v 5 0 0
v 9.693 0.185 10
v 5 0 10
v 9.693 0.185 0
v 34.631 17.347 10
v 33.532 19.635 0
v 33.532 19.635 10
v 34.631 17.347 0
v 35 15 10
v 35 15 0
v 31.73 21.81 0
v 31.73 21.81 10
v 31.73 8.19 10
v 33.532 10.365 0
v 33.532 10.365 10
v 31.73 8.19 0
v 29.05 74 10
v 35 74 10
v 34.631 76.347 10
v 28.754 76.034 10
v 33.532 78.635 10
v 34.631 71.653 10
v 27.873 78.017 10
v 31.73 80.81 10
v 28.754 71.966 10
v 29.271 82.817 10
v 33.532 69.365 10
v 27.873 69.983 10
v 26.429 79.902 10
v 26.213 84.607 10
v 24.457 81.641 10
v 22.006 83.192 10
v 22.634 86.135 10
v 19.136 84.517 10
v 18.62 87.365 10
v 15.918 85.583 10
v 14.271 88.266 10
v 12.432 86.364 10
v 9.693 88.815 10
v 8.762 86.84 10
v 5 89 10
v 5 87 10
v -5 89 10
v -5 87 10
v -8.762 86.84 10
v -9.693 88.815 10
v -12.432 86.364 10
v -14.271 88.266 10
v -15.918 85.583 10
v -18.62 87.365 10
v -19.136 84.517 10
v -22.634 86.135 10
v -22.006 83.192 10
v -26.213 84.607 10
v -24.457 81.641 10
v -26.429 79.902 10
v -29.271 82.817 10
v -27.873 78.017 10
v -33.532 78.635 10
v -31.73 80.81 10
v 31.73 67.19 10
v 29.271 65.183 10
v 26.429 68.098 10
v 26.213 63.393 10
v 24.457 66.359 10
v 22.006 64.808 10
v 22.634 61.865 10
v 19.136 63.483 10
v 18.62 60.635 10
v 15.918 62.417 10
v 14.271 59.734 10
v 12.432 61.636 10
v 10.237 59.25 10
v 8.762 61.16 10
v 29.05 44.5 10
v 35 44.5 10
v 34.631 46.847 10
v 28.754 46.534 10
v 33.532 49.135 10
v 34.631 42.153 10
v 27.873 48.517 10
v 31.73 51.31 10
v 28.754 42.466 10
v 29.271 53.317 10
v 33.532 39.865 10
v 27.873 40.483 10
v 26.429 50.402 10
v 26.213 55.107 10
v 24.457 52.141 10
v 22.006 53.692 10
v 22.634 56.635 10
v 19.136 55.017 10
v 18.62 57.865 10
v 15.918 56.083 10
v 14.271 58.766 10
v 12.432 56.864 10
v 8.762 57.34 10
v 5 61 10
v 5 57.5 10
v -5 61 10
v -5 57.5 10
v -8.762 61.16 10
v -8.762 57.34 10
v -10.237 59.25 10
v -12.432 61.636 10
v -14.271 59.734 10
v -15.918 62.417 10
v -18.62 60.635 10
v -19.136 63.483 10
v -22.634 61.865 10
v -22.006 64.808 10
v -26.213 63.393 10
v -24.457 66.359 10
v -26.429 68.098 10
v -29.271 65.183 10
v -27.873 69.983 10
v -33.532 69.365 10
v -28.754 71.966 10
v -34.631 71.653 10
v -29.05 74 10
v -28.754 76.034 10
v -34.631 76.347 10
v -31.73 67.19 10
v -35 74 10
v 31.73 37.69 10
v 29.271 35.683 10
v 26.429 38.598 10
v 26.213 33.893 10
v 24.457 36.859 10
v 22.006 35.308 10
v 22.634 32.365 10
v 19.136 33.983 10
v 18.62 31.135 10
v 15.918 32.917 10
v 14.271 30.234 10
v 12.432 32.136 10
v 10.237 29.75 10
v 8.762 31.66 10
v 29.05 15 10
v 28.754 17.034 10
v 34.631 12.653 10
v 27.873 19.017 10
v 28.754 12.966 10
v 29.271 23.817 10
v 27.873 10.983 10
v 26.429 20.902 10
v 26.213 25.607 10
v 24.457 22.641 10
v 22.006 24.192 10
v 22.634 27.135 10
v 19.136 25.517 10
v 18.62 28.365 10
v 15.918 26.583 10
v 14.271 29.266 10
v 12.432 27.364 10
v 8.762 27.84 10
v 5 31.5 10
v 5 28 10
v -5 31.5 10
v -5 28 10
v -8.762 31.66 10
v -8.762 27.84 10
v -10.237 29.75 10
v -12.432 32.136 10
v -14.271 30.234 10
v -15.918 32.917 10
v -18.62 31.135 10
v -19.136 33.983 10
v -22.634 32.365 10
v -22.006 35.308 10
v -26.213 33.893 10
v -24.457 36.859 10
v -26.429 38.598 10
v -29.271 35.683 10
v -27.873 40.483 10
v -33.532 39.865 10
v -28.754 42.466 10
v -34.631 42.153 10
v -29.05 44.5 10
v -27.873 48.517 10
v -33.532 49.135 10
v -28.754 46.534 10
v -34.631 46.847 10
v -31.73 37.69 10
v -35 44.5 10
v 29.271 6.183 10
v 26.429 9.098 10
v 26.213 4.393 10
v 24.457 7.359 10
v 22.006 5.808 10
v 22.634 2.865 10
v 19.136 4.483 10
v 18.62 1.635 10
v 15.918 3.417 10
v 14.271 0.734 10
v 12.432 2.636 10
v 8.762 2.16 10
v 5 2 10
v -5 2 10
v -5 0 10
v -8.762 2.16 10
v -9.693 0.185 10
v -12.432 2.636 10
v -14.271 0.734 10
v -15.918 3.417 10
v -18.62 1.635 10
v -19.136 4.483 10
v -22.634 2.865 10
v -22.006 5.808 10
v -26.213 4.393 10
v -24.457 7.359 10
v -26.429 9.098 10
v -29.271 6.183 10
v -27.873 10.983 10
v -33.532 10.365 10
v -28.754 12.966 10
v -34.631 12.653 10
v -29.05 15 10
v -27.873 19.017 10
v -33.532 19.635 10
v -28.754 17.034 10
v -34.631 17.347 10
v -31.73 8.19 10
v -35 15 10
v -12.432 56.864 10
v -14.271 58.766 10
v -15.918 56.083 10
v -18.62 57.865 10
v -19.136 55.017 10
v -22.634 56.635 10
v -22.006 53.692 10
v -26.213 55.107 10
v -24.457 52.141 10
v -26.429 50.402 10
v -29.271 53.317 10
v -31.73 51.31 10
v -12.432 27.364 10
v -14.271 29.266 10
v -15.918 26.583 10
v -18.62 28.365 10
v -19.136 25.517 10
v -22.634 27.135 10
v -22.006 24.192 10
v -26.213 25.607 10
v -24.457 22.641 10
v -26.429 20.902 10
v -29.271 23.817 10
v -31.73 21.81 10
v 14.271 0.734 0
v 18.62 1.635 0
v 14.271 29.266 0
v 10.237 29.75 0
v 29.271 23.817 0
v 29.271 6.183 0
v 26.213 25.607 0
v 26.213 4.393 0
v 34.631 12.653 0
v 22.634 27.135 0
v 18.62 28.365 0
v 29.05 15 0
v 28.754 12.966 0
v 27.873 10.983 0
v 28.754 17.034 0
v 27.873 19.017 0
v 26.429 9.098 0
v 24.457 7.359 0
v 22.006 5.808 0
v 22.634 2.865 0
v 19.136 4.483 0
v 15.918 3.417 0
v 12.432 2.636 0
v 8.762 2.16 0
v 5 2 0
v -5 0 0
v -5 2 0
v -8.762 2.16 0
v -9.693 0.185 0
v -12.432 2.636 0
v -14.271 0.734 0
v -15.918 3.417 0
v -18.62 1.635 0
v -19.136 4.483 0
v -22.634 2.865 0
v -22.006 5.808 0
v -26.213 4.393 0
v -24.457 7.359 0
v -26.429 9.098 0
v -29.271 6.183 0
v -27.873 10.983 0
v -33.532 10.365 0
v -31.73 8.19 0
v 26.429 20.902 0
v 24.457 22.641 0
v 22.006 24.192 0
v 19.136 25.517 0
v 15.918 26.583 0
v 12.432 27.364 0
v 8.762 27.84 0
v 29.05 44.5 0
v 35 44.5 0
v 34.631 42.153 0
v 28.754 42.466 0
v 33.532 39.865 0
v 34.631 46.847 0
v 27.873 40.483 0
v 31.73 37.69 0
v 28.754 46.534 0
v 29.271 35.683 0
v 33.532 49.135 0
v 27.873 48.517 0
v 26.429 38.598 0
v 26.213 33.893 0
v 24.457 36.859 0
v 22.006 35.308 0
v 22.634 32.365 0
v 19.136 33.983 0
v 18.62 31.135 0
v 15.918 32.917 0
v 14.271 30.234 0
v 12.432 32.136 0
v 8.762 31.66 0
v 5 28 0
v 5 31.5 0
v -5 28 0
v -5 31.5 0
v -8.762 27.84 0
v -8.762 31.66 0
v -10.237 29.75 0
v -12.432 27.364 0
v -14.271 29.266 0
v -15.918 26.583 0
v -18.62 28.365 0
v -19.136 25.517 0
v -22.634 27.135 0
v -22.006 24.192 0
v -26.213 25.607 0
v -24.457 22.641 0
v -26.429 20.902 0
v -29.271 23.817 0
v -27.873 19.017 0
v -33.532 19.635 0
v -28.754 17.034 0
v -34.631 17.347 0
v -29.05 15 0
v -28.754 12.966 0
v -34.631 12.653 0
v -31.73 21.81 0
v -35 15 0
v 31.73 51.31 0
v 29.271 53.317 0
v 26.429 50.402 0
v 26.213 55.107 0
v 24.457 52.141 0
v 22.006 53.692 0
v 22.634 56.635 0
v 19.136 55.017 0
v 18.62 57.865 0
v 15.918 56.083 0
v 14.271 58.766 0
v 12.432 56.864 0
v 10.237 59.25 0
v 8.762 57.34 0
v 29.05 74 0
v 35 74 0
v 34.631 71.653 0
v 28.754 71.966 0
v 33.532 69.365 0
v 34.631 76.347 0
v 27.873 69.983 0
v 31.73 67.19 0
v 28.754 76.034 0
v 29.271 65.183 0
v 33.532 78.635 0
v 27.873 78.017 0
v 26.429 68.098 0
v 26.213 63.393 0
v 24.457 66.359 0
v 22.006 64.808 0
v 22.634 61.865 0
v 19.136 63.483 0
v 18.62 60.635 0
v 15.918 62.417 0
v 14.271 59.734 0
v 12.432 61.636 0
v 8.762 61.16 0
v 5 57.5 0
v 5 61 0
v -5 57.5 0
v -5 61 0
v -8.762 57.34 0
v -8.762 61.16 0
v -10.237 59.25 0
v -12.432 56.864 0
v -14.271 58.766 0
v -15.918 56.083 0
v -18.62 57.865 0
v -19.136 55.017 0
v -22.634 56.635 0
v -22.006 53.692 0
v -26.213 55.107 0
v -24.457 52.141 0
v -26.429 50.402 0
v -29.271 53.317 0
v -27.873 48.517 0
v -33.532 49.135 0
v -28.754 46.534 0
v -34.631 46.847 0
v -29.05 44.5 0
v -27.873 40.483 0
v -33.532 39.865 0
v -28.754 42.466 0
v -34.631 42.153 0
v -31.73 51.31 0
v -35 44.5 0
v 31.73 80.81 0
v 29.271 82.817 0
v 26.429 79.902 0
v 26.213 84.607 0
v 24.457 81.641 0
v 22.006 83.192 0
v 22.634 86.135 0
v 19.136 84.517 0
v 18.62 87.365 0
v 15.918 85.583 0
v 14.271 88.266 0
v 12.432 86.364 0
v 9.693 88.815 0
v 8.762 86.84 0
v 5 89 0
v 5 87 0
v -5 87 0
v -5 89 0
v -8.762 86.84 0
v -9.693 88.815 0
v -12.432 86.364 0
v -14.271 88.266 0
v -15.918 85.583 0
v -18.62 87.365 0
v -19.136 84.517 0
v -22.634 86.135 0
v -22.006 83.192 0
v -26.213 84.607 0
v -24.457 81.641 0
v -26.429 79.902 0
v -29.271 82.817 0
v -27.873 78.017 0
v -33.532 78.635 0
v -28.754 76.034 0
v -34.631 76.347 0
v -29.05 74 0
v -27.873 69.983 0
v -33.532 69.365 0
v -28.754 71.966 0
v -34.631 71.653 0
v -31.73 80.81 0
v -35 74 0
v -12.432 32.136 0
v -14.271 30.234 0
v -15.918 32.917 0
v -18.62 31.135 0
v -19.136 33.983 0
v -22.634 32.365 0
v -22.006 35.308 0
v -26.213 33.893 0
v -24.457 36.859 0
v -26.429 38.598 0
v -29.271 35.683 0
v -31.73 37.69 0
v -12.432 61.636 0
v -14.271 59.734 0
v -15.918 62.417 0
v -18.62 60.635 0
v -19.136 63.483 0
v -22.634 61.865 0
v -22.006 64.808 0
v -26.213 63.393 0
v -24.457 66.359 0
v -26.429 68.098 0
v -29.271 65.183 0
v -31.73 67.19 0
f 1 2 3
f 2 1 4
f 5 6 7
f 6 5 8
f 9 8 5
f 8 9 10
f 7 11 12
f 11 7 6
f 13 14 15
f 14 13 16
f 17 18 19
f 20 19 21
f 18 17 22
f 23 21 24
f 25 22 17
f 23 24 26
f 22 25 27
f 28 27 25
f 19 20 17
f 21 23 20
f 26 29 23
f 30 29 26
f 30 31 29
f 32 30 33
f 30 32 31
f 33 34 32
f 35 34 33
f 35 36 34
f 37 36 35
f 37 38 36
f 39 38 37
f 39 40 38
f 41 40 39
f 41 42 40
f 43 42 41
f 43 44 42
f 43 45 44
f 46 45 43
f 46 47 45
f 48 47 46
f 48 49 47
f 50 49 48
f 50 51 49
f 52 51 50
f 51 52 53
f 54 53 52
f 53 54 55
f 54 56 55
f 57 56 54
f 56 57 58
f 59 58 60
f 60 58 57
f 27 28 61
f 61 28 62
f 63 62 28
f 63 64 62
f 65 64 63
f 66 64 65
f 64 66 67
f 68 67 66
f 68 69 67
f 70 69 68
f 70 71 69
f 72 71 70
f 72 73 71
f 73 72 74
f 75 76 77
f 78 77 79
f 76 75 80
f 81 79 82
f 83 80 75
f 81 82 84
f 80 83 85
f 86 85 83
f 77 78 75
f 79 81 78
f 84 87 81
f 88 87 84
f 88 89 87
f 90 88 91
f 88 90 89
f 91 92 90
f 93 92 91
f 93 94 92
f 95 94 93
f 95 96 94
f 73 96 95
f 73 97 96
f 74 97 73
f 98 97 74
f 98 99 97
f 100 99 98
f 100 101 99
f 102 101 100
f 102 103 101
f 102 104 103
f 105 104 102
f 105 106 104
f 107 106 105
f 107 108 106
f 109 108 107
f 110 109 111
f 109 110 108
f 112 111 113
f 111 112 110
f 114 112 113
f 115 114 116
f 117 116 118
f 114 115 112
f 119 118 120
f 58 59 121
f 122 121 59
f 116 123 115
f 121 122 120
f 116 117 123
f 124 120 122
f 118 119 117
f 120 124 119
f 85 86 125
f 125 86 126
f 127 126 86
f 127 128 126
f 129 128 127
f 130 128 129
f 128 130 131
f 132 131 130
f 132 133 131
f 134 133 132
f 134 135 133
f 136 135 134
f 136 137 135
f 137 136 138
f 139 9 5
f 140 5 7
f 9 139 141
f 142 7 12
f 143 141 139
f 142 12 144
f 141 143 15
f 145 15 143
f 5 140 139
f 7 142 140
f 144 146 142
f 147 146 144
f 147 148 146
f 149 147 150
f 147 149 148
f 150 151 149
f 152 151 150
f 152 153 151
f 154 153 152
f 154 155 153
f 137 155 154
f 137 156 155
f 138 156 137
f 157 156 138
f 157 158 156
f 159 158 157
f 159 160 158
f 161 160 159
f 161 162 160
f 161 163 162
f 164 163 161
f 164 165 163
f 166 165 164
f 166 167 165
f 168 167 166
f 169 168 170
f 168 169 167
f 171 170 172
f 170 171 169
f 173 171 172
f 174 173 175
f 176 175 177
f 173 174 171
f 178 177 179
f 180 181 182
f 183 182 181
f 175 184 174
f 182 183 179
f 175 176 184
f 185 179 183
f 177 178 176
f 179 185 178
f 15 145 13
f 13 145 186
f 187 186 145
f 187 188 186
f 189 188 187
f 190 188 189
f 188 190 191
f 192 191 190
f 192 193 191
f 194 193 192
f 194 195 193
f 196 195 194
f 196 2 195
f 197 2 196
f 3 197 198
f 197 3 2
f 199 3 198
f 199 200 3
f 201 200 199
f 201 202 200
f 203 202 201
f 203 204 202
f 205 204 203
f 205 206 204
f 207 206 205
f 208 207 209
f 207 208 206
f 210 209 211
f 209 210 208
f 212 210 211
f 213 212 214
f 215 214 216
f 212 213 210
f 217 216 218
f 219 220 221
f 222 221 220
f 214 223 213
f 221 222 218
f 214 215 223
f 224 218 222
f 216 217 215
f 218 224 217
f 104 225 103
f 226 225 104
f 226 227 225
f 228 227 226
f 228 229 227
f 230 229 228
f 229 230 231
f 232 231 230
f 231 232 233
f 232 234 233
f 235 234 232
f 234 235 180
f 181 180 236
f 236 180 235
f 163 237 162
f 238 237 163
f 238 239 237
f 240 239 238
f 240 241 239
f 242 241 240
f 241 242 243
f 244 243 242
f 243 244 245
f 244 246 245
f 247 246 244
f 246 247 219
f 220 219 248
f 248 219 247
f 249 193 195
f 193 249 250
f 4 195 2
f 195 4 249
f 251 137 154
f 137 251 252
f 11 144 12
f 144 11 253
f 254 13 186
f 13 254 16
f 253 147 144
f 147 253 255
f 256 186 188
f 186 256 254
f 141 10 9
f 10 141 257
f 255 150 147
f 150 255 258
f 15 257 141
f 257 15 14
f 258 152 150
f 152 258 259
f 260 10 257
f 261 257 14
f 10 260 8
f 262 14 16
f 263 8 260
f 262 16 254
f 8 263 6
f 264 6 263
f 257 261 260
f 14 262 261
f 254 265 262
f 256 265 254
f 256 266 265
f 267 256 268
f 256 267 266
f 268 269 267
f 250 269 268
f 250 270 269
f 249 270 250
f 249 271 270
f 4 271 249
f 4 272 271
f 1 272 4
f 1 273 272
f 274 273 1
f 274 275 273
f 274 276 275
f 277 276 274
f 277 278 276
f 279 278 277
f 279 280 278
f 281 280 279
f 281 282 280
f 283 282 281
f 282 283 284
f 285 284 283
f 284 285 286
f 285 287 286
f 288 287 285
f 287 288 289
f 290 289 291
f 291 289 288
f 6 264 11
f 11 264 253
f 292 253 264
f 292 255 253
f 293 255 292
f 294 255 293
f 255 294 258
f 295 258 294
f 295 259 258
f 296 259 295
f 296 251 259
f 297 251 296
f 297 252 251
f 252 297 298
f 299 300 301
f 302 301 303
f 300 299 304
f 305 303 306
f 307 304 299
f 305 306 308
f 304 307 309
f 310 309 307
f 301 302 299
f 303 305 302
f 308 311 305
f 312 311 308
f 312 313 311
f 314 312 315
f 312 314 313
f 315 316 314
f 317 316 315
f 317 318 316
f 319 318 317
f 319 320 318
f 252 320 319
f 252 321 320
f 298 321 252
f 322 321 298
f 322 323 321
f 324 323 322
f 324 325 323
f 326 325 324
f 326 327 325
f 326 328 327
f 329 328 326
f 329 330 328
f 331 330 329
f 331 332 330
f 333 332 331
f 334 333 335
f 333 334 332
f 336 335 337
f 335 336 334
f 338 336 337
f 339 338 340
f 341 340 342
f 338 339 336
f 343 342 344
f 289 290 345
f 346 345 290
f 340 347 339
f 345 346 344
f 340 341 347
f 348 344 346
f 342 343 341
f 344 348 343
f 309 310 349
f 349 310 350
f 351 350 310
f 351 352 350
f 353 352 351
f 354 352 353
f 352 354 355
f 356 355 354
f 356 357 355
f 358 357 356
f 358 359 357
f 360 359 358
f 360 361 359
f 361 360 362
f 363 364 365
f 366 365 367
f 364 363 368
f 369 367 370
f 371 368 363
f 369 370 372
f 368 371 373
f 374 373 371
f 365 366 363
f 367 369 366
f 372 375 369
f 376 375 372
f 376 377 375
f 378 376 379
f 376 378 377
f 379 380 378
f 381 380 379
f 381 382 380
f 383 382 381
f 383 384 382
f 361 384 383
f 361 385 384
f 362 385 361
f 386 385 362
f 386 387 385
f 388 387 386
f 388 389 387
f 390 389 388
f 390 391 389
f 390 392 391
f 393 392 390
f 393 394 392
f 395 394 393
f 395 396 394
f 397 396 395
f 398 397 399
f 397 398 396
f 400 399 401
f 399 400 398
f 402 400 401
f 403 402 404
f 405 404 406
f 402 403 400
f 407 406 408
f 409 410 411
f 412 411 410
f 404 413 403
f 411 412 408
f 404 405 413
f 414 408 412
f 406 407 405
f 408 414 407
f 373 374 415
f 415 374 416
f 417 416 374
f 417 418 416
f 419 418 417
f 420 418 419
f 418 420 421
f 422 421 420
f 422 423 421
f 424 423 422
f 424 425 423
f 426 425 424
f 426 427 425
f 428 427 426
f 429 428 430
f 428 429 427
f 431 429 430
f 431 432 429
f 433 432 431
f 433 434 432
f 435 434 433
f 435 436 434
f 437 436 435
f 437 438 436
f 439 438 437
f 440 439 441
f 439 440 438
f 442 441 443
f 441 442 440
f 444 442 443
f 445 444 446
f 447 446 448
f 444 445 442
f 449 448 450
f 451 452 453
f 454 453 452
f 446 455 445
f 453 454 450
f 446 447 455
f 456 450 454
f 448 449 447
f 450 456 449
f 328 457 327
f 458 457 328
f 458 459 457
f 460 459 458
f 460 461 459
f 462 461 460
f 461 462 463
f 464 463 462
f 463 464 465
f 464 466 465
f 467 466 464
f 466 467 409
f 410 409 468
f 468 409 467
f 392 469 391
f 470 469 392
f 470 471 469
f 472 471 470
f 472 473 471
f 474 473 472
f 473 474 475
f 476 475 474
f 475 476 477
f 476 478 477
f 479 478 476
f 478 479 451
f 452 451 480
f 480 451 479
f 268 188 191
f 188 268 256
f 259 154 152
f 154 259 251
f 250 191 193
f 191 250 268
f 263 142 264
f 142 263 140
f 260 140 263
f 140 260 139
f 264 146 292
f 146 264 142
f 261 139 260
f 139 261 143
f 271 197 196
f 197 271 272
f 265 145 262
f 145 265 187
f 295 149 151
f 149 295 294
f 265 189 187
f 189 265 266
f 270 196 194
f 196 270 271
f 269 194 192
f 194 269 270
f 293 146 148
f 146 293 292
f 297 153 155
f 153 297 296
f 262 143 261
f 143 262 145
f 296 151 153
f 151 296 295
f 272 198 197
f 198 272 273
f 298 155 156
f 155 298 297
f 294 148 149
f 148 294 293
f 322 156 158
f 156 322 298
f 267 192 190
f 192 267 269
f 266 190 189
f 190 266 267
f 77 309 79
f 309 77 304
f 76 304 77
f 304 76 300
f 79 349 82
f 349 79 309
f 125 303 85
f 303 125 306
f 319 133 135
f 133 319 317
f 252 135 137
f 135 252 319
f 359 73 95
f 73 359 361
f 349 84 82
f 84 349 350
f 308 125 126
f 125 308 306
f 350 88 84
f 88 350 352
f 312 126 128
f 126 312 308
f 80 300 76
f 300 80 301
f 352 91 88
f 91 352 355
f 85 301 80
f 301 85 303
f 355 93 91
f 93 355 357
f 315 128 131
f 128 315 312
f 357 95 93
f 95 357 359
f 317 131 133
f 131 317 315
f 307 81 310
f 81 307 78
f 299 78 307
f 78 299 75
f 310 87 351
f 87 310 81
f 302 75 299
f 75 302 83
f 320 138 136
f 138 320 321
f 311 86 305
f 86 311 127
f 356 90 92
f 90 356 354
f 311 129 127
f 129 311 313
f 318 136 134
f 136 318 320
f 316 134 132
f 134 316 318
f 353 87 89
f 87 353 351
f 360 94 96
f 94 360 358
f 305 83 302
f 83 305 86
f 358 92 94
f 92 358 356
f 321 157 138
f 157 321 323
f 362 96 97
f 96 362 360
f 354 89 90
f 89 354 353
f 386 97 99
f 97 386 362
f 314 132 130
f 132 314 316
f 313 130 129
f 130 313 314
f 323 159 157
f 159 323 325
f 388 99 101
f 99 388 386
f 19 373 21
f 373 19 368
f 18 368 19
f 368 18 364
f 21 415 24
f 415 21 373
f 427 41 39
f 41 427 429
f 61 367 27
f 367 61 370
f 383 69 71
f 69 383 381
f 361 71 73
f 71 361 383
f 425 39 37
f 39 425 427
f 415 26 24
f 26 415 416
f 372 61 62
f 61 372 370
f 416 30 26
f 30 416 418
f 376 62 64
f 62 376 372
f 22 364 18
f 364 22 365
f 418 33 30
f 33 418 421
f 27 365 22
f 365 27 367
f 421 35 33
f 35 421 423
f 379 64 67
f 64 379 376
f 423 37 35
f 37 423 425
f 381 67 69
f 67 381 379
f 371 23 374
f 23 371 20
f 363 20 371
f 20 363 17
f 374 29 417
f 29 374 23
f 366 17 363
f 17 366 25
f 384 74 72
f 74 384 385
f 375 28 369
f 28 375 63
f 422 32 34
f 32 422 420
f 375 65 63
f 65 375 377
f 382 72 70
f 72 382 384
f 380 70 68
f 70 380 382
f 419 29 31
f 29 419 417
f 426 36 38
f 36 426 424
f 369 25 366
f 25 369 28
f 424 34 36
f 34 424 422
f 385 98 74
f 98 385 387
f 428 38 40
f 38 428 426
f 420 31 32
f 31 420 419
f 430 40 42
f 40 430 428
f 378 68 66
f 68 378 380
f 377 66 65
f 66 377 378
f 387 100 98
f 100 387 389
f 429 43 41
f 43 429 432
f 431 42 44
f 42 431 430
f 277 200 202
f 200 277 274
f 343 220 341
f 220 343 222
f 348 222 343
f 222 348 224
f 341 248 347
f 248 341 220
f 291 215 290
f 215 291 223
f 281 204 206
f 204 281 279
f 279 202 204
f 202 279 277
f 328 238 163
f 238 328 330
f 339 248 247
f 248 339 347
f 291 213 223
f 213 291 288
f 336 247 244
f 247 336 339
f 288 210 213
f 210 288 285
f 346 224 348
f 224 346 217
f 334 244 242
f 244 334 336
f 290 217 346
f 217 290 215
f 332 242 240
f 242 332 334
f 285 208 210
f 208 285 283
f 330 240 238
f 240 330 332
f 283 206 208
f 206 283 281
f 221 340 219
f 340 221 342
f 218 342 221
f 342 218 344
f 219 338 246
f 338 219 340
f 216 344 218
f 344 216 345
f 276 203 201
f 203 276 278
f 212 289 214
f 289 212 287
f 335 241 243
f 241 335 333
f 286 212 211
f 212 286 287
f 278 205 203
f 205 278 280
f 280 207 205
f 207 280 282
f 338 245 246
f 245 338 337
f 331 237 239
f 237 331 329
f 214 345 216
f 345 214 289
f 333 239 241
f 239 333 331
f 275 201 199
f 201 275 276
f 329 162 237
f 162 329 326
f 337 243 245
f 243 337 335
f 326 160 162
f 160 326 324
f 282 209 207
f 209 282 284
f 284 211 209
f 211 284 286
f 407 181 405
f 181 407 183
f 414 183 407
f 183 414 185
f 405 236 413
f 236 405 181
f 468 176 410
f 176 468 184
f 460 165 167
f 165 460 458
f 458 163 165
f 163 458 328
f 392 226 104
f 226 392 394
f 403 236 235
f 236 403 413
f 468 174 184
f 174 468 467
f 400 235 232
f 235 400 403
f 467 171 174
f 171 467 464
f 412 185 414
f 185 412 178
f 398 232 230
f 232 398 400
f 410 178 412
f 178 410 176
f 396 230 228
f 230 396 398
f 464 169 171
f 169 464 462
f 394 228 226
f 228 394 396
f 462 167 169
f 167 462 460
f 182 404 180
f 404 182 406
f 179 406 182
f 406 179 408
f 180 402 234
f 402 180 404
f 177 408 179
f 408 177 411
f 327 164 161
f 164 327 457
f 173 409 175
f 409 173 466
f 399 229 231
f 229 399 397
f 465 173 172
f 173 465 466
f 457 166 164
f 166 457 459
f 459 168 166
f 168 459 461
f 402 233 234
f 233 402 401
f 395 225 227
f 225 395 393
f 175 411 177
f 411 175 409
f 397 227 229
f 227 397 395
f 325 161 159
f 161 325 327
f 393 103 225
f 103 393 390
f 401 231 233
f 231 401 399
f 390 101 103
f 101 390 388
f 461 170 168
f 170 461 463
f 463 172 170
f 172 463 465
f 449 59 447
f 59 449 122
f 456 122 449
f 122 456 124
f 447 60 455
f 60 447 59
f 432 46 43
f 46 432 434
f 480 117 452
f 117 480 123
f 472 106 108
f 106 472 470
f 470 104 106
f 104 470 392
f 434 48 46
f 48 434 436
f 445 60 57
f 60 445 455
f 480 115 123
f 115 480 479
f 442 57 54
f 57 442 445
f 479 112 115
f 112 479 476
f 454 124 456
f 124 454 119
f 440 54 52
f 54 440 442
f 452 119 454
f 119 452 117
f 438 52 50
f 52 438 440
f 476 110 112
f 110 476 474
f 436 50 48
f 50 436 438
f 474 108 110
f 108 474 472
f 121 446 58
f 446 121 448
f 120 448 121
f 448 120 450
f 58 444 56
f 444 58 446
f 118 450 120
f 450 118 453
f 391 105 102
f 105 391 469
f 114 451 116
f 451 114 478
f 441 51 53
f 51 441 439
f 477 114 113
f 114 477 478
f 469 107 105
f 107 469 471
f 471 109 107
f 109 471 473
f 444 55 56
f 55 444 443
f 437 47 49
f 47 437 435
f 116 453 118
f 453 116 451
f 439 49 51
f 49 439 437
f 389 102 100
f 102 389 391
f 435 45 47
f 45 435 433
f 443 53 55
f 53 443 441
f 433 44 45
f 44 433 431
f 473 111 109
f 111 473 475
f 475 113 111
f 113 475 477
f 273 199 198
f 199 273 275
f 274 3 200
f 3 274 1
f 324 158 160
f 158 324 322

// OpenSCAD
///////////////////////////////////////////////////////
// PARAMETERS
thkInPlane = 2.0; //mm Thickness of the circular section before scaling
widthInPlane = 40; //width of spring in mm
thkOutOfPlane = 10; //mm

$fn=40;
diaExt = 30;
scaleX1 = 2.0;
scaleY1 = 1.0;
scaleX2 = 1.85;
scaleY2 = 1.0;
overlap = 0.5;

diaInt = diaExt - 2*thkInPlane;

//To calculate the length of the bottom flat piece (cube), we need to use "scaleX" information:
lengthOfCube = widthInPlane/2 - scaleX1*diaExt/4; echo(lengthOfCube);

module scaled_half_circle(thkOut, dia1, dia2, scale_x1, scale_y1, scale_x2, scale_y2) {
translate([0,dia1/2,0])
intersection(){
difference() {
	scale([scale_x1, scale_y1, 1]) cylinder(h=thkOut, d1=dia1, d2=dia1, center=false);
	scale([scale_x2, scale_y2, 1]) translate([0,0,-2.5]) cylinder(h=thkOut+5, d1=dia2, d2=dia2, center=false);
	}
	translate([dia1/2,0,thkOut/2]) cube([dia1,dia1,thkOut*2], center=true);
	}
}


// 1.SECTION
cube([lengthOfCube,2,thkOutOfPlane], center=false);
translate([lengthOfCube,0,0]) scaled_half_circle(thkOutOfPlane, diaExt, diaInt, scaleX1, scaleY1, scaleX2, scaleY2);
translate([0,diaExt-2,0]) cube([lengthOfCube,2,thkOutOfPlane], center=false);

// 2.SECTION
translate([0,1*(diaExt-overlap),0]){
cube([lengthOfCube,2,thkOutOfPlane], center=false);
translate([lengthOfCube,0,0]) scaled_half_circle(thkOutOfPlane, diaExt, diaInt, scaleX1, scaleY1, scaleX2, scaleY2);
translate([0,diaExt-2,0]) cube([lengthOfCube,2,thkOutOfPlane], center=false);
}

// 3.SECTION
translate([0,2*(diaExt-overlap),0]){
cube([lengthOfCube,2,thkOutOfPlane], center=false);
translate([lengthOfCube,0,0]) scaled_half_circle(thkOutOfPlane, diaExt, diaInt, scaleX1, scaleY1, scaleX2, scaleY2);
translate([0,diaExt-2,0]) cube([lengthOfCube,2,thkOutOfPlane], center=false);
}

// MIRROR

mirror([1,0,0]){
// 1.SECTION
cube([lengthOfCube,2,thkOutOfPlane], center=false);
translate([lengthOfCube,0,0]) scaled_half_circle(thkOutOfPlane, diaExt, diaInt, scaleX1, scaleY1, scaleX2, scaleY2);
translate([0,diaExt-2,0]) cube([lengthOfCube,2,thkOutOfPlane], center=false);

// 2.SECTION
translate([0,1*(diaExt-overlap),0]){
cube([lengthOfCube,2,thkOutOfPlane], center=false);
translate([lengthOfCube,0,0]) scaled_half_circle(thkOutOfPlane, diaExt, diaInt, scaleX1, scaleY1, scaleX2, scaleY2);
translate([0,diaExt-2,0]) cube([lengthOfCube,2,thkOutOfPlane], center=false);
}

// 3.SECTION
translate([0,2*(diaExt-overlap),0]){
cube([lengthOfCube,2,thkOutOfPlane], center=false);
translate([lengthOfCube,0,0]) scaled_half_circle(thkOutOfPlane, diaExt, diaInt, scaleX1, scaleY1, scaleX2, scaleY2);
translate([0,diaExt-2,0]) cube([lengthOfCube,2,thkOutOfPlane], center=false);
}

}
